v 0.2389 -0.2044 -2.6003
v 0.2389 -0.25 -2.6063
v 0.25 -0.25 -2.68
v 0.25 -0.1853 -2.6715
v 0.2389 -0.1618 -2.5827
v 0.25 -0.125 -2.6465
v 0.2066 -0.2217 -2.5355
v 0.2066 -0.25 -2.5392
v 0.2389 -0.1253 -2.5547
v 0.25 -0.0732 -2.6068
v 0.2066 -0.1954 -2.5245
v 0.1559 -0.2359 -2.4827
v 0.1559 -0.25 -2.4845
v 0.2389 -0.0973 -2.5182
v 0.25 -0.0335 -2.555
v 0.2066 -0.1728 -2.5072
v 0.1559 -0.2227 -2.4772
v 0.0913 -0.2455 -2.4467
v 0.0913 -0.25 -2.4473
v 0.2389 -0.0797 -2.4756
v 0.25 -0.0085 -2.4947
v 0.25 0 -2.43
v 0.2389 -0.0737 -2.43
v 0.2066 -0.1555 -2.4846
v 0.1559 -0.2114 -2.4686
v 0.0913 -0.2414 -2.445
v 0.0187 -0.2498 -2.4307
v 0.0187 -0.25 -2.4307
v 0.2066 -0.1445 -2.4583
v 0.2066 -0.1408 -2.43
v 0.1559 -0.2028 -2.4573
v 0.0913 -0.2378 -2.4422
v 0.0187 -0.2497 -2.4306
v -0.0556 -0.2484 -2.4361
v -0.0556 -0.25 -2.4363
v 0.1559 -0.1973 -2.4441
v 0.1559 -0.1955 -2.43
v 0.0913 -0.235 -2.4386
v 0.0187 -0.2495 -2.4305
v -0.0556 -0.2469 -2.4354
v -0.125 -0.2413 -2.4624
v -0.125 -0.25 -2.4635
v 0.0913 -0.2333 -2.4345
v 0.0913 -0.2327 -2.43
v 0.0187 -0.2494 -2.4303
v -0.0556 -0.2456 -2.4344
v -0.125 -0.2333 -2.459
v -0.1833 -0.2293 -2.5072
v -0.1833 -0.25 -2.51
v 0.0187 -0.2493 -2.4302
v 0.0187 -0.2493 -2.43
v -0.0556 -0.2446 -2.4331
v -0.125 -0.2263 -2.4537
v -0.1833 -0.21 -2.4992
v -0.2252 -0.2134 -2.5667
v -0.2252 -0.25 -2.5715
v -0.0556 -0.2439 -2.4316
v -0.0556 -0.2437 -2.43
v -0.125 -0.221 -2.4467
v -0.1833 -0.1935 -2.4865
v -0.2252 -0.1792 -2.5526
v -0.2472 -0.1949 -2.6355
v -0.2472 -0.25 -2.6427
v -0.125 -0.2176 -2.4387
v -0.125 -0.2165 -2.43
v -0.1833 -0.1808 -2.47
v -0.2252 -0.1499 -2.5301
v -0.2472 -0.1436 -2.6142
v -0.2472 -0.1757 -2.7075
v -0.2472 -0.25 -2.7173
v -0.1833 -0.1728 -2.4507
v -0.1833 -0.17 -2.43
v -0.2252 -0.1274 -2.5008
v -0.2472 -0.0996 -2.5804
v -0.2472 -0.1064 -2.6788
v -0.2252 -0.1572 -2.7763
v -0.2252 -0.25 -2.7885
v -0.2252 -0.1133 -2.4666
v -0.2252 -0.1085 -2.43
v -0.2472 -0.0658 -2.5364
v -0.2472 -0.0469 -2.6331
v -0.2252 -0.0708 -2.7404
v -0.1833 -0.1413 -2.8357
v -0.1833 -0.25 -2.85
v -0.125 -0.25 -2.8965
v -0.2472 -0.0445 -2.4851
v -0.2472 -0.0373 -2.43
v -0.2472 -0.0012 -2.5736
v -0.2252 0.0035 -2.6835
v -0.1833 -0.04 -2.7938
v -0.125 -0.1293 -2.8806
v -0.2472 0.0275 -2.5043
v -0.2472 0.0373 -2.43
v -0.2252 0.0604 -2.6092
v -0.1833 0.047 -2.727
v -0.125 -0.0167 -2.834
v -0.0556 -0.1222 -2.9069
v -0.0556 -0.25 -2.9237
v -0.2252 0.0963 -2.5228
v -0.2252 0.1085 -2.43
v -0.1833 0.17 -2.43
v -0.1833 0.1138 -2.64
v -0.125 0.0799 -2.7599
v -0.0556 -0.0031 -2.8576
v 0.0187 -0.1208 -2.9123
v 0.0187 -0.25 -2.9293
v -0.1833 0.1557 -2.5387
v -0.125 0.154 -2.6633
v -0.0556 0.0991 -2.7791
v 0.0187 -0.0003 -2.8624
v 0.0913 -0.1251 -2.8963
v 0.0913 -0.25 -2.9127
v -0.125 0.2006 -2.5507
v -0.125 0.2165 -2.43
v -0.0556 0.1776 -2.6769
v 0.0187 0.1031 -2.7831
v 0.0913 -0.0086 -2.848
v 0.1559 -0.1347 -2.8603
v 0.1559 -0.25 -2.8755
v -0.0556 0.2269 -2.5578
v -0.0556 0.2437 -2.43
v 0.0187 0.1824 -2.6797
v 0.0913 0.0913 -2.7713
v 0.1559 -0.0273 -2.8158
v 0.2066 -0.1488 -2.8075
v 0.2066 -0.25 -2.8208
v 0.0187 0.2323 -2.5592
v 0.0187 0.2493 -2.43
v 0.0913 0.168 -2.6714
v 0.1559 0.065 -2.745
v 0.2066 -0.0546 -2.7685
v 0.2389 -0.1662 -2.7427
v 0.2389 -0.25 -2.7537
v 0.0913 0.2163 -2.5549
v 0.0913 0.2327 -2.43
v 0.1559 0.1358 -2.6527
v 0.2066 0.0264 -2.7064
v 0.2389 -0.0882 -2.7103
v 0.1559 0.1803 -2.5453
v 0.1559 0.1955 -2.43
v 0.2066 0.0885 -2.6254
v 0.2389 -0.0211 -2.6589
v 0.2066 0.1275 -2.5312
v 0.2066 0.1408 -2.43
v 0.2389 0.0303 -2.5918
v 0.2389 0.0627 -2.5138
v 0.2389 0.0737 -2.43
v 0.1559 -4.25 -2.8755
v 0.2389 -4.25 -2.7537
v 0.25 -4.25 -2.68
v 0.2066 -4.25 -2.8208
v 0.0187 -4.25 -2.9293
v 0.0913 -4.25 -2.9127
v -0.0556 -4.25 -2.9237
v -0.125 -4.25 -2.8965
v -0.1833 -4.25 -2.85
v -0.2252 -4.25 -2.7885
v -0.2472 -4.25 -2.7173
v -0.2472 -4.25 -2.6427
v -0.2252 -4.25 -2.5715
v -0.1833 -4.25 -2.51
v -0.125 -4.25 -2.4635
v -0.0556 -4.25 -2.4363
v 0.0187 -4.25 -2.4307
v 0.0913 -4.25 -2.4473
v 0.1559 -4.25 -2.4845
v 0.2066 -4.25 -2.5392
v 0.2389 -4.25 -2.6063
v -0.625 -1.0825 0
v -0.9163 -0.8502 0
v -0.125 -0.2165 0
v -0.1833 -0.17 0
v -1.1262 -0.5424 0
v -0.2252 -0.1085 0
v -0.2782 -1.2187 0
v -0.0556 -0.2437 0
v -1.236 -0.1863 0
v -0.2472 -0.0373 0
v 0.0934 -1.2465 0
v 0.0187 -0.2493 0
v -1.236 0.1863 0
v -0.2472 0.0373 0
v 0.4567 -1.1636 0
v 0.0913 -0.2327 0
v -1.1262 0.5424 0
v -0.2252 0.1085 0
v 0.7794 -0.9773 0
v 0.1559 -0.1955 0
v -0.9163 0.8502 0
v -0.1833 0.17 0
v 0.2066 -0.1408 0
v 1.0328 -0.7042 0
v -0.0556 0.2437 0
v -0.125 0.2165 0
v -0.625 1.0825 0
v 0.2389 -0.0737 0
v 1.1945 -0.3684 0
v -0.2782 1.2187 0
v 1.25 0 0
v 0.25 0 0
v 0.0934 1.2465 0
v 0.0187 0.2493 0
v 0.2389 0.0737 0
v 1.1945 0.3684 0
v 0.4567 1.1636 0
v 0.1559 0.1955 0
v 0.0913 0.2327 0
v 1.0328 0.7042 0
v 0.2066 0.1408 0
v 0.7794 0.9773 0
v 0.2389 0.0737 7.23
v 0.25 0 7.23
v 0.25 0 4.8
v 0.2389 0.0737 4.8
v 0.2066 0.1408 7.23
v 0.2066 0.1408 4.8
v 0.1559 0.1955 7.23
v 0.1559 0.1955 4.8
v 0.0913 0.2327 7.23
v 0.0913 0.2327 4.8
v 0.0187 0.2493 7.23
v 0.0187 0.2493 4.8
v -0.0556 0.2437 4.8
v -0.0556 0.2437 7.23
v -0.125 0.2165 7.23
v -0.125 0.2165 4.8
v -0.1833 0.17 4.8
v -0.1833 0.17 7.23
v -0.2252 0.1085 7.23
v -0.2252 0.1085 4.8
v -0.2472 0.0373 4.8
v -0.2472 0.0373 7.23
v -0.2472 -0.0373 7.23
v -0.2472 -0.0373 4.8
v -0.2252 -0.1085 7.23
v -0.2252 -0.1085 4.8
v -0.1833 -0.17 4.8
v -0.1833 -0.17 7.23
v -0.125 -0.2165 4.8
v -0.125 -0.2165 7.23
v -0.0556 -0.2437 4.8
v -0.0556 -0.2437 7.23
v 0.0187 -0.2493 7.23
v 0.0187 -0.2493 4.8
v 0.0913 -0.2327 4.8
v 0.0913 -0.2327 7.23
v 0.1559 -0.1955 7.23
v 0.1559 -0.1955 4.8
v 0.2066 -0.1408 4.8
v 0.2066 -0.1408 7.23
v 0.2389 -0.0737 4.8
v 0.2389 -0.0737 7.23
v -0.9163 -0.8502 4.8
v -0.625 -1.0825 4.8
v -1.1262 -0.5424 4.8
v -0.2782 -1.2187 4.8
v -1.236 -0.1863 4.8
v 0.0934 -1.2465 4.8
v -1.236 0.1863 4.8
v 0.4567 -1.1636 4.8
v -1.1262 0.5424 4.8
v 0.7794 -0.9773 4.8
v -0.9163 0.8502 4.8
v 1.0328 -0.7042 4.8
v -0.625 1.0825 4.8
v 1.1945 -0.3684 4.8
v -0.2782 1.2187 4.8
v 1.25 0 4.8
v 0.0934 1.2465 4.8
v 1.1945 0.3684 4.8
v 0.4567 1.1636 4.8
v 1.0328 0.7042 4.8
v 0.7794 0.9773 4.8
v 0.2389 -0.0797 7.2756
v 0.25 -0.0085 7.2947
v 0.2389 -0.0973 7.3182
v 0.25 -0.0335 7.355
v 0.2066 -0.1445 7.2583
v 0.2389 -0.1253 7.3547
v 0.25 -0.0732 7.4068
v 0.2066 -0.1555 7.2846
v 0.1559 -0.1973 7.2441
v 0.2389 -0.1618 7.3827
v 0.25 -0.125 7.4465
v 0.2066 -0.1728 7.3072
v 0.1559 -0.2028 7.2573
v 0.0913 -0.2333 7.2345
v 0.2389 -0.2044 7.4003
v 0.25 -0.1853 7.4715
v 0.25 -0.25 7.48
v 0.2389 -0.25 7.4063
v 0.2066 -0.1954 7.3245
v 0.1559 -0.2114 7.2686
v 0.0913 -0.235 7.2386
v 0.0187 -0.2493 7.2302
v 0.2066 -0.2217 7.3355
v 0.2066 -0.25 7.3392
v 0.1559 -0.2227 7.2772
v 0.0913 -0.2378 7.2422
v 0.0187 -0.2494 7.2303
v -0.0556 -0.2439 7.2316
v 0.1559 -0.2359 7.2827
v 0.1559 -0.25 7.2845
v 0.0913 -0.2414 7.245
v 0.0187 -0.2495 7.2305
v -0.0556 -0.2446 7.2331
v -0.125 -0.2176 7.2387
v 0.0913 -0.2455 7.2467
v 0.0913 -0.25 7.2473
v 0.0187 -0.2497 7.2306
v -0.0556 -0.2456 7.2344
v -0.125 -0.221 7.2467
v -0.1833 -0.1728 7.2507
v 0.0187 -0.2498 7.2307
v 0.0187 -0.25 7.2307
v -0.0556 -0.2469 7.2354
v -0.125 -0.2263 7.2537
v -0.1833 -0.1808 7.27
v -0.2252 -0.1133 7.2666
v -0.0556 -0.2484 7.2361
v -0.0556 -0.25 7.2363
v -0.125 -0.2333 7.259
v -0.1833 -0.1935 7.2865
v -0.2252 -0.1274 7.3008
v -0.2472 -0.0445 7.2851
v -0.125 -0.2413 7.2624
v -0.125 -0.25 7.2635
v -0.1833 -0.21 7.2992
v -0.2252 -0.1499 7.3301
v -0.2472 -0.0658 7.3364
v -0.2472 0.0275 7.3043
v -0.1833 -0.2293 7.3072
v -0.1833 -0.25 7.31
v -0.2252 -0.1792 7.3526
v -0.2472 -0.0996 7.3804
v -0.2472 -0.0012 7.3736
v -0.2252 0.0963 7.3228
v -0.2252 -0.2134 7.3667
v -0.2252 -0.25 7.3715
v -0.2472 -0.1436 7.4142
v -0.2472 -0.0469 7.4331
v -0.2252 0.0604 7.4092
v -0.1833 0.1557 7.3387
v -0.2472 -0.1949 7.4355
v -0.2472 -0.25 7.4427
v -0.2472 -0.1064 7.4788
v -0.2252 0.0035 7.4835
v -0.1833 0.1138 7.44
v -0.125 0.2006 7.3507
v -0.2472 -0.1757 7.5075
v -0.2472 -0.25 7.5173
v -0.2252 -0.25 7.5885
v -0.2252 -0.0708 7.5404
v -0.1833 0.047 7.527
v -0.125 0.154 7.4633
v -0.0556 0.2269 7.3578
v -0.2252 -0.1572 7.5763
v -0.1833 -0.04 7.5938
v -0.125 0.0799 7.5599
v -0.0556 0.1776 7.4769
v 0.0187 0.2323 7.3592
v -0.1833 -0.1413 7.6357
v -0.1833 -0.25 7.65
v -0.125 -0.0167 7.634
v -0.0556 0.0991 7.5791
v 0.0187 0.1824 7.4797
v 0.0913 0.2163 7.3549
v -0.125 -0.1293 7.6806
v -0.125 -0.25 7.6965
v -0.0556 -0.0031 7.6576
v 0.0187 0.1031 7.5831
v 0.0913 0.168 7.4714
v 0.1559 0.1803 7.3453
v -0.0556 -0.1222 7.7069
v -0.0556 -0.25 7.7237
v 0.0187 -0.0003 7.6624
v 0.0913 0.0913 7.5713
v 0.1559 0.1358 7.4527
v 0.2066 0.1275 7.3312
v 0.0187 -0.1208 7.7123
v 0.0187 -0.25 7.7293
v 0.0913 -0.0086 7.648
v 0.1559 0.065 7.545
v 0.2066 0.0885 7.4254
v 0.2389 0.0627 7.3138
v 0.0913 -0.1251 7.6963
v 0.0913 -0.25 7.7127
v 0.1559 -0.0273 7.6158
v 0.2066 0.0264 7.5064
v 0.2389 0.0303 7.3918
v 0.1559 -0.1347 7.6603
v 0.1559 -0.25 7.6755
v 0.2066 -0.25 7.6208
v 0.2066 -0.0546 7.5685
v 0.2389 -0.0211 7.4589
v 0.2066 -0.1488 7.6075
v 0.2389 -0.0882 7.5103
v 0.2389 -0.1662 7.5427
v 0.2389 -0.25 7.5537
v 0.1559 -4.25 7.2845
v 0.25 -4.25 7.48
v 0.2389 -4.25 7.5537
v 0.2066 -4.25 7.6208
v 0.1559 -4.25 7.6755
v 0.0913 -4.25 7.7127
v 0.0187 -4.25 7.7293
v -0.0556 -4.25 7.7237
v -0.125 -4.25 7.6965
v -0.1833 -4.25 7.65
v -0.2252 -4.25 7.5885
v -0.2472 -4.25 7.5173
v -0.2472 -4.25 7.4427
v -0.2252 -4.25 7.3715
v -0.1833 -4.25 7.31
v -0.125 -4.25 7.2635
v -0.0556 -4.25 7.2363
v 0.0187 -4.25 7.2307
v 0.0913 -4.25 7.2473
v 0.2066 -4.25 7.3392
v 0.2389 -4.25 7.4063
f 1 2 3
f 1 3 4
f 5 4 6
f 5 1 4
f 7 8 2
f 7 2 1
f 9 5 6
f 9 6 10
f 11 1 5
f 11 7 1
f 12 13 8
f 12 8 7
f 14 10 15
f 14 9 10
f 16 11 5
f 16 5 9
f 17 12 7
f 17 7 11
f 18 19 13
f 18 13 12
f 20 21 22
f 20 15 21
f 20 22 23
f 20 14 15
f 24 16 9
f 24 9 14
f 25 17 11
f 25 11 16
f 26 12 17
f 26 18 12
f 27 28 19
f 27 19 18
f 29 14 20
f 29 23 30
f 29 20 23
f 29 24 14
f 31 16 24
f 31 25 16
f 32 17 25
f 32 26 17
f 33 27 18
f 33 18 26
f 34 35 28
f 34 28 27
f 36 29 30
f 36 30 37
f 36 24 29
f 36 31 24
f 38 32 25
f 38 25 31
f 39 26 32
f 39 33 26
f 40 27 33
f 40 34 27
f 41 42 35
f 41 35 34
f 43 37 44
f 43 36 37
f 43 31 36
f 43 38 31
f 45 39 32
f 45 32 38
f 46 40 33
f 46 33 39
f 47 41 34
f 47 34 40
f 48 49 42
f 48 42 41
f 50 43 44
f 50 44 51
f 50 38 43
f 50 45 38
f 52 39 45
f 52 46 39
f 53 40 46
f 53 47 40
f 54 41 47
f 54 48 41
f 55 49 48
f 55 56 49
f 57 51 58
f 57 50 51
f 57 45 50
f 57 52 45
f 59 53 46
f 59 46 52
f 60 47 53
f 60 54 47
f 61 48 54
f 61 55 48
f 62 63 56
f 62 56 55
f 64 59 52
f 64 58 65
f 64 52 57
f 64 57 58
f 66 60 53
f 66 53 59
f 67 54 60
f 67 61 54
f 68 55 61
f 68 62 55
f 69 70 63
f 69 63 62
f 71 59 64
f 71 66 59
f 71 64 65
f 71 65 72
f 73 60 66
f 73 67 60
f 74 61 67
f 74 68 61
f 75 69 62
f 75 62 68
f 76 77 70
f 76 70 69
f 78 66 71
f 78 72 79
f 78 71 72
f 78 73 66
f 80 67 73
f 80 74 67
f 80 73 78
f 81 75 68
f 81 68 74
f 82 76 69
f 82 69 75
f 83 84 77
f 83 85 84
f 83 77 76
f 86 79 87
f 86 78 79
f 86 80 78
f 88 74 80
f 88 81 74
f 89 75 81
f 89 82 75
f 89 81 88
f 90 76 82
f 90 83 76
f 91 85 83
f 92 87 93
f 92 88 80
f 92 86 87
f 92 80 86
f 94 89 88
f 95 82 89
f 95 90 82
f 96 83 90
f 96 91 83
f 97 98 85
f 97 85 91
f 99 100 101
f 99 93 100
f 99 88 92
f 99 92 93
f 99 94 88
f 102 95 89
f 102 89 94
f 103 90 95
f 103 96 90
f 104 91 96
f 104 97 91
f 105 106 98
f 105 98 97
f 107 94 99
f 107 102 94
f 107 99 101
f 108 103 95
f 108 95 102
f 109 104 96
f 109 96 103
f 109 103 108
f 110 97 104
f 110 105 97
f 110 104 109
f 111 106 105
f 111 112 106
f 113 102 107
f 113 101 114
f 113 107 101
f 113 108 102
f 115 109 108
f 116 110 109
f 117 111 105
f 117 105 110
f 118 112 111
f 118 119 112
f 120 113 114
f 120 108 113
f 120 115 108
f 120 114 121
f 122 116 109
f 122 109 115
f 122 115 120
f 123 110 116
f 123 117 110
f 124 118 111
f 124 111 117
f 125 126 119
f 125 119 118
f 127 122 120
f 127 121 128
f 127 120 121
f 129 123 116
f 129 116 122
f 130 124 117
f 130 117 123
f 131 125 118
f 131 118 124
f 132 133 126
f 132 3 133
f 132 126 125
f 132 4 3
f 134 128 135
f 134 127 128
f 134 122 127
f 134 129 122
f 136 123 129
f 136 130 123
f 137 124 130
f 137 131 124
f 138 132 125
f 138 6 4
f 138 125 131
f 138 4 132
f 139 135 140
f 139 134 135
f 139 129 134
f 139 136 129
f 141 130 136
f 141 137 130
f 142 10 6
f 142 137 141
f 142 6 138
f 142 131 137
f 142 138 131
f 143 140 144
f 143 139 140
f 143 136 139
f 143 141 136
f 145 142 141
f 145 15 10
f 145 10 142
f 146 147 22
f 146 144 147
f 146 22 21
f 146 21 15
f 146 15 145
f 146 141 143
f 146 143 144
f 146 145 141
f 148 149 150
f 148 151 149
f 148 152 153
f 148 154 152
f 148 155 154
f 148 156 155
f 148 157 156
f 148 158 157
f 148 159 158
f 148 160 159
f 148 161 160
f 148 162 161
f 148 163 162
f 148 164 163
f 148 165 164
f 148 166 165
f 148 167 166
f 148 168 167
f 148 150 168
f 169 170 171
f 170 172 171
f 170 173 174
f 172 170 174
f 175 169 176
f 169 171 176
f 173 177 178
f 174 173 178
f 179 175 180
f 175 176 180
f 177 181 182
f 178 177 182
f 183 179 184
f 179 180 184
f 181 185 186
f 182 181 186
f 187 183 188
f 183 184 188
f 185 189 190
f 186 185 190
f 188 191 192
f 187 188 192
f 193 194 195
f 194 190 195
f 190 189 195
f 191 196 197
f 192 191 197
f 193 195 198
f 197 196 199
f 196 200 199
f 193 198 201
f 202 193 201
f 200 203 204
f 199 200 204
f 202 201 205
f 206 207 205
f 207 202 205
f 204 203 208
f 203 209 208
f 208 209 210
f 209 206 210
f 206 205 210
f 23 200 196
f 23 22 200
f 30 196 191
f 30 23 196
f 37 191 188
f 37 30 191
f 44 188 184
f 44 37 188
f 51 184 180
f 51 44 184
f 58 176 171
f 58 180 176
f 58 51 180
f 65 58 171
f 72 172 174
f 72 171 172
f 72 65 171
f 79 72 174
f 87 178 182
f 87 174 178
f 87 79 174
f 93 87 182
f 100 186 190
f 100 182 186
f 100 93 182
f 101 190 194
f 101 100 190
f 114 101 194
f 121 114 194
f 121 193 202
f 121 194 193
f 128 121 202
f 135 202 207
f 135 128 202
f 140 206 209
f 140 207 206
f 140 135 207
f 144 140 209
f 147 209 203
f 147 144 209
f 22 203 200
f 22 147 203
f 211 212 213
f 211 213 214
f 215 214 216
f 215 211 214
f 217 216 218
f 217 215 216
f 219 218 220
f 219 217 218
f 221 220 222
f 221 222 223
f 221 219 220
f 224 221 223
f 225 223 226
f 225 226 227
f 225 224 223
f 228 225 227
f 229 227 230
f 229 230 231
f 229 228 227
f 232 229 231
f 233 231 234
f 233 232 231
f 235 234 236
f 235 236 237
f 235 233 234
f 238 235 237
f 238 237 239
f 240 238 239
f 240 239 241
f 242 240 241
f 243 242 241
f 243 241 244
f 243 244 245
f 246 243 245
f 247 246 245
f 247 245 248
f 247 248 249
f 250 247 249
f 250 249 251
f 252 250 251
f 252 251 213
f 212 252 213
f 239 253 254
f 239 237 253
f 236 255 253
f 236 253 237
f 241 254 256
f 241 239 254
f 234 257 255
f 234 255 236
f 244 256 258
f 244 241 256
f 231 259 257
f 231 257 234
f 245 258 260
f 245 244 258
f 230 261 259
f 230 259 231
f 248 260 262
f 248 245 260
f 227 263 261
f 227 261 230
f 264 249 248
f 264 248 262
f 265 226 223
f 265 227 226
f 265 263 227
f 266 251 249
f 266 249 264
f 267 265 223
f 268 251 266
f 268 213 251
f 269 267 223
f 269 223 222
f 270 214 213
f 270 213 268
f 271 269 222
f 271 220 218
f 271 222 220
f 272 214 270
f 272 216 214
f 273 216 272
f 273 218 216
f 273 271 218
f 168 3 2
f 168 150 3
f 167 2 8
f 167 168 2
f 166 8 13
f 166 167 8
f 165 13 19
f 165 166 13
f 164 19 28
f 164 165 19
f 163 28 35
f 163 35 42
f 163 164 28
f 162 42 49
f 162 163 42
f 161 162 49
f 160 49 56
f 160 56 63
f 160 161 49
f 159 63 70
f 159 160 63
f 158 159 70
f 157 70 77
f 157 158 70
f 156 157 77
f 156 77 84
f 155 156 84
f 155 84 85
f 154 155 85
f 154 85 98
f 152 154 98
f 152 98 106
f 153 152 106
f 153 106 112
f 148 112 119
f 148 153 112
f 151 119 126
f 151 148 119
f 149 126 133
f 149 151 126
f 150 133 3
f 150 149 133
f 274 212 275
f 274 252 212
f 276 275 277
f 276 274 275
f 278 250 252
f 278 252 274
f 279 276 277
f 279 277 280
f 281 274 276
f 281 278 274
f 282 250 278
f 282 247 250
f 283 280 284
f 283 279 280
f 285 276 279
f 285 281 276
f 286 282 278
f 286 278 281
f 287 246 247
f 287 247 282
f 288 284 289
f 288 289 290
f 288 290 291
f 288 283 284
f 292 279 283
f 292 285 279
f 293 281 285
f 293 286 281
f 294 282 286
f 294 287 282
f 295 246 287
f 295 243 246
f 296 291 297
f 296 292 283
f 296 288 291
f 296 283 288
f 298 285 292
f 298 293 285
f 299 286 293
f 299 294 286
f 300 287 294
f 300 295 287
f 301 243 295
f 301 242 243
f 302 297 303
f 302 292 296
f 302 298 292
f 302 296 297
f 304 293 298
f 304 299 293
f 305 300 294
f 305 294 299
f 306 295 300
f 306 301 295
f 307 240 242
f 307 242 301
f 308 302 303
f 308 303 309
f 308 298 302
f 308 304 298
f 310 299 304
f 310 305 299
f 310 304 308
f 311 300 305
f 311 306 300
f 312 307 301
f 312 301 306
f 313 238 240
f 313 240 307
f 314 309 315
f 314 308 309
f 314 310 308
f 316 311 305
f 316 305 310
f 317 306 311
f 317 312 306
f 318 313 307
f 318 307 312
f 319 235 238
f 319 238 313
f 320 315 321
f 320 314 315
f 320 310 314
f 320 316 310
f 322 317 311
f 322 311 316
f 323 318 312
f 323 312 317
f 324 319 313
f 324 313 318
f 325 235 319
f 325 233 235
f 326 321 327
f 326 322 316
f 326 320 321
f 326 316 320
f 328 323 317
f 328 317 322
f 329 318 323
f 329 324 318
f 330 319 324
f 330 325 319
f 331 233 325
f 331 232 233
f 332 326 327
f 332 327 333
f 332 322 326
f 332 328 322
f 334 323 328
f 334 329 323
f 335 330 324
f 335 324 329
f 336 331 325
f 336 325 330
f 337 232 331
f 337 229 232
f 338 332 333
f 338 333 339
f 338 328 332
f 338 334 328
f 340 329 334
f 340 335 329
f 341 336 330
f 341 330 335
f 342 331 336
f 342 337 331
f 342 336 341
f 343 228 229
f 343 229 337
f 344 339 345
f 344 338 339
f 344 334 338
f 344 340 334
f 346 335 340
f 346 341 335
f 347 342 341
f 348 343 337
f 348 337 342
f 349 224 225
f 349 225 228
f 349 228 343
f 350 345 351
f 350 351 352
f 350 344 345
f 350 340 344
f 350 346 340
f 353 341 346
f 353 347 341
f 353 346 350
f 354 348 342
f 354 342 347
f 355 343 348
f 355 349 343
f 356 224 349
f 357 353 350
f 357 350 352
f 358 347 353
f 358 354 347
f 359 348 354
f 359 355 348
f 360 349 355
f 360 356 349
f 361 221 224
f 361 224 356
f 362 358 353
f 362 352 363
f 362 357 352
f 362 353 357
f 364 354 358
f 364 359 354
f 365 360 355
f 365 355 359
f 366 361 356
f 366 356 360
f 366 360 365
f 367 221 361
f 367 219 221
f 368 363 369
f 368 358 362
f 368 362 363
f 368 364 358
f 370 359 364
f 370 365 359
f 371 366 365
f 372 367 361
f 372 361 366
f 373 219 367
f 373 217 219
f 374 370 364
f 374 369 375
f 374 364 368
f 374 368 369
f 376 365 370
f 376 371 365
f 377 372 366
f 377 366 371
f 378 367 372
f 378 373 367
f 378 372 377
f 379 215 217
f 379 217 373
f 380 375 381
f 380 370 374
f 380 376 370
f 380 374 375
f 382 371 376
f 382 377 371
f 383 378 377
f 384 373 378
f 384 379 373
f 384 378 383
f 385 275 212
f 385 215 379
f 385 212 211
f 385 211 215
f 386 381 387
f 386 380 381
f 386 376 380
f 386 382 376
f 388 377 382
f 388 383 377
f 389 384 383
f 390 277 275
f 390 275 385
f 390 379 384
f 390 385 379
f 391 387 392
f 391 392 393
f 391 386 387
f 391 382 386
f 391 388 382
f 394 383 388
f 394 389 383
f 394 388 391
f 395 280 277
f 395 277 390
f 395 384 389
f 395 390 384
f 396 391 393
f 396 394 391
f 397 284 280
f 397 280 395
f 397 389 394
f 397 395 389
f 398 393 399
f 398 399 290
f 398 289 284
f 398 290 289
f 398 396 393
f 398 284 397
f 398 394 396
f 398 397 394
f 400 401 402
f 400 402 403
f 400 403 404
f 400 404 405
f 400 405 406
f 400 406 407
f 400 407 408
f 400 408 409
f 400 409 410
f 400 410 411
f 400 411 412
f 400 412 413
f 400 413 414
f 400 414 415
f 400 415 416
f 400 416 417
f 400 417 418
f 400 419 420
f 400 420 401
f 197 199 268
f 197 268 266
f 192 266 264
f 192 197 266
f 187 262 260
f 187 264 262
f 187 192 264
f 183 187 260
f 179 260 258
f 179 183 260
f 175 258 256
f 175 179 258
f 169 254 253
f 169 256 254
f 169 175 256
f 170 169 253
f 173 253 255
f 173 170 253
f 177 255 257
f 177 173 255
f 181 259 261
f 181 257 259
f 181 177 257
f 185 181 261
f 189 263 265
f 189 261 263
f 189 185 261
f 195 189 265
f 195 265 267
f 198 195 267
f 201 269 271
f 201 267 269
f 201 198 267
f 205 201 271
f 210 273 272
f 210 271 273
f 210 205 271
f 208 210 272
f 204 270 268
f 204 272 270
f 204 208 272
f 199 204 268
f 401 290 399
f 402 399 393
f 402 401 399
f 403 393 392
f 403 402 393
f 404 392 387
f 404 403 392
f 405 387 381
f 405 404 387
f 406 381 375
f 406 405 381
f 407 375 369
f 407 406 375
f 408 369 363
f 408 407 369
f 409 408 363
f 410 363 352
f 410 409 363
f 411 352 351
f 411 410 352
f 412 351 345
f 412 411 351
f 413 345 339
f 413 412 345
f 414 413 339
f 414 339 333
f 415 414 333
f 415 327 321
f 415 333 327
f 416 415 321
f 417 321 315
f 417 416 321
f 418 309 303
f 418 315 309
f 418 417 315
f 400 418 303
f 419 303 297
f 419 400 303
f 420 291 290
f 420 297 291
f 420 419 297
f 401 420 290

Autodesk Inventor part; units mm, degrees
sketch "Skizze3" plane through (0, 0, 0) normal (0, 0, 1) x (1, 0, 0)
  circle A0 centre (0, 0) radius 1.25
  dimension "d0" = 2.5
extrude "Extrusion1" add sketch "Skizze3" along normal blind 4.8
ref_plane "Arbeitsebene1" through (0, 0, 3.8) normal (0, 0, 1) x (1, 0, 0)
split_face "Trennen1"
ref_plane "Arbeitsebene2" through (0, 0, 0) normal (1, 0, 0) x (0, 1, 0)
sketch "Skizze6" plane through (0, 0, 0) normal (1, 0, 0) x (0, 1, 0)
  line L0 (0, 4.8) -> (0, 7.23)
  arc A0 (0, 7.23) -> (-0.25, 7.48) centre (-0.25, 7.23) ccw
  line L1 (-0.25, 7.23) -> (-0.25, 7.48) construction
  line L2 (-0.25, 7.23) -> (0, 7.23) construction
  line L3 (-0.25, 7.48) -> (-4.25, 7.48)
  line L4 (1.25, 4.8) -> (-1.25, 4.8) projected
  line L5 (1.25, 4.8) -> (1.25, 3.8) projected
  line L6 (1.25, 3.8) -> (1.25, 0) projected
  line L7 (1.25, 0) -> (-1.25, 0) projected
  line L8 (-1.25, 0) -> (-1.25, 3.8) projected
  line L9 (-1.25, 3.8) -> (-1.25, 4.8) projected
  line L10 (-1.25, 4.8) -> (1.25, 4.8) projected
  line L11 (-1.25, 3.8) -> (-1.25, 4.8) projected
  point P0 (0, 0)
  dimension "d7" = 90
  dimension "d9" = 2.43
  dimension "d10" = 4
  dimension "d13" = 0.25
  dimension "d20" = 0.25
  dimension "d21" = 1.25
sketch "Skizze4" plane through (0, 0, 4.8) normal (0, 0, 1) x (1, 0, 0)
  circle A0 centre (0, 0) radius 0.25
  dimension "d4" = 0.5
sweep "Sweeping1" add profiles "Skizze4" path "Skizze6" path curves L0 A0 L3
ref_plane "Arbeitsebene3" through (0, 0, 2.4) normal (0, 0, -1) x (-1, 0, 0)
mirror "Spiegeln1" about plane through (0, 0, 2.4) normal (0, 0, -1) of "Sweeping1"
properties part number "Diod1e"
